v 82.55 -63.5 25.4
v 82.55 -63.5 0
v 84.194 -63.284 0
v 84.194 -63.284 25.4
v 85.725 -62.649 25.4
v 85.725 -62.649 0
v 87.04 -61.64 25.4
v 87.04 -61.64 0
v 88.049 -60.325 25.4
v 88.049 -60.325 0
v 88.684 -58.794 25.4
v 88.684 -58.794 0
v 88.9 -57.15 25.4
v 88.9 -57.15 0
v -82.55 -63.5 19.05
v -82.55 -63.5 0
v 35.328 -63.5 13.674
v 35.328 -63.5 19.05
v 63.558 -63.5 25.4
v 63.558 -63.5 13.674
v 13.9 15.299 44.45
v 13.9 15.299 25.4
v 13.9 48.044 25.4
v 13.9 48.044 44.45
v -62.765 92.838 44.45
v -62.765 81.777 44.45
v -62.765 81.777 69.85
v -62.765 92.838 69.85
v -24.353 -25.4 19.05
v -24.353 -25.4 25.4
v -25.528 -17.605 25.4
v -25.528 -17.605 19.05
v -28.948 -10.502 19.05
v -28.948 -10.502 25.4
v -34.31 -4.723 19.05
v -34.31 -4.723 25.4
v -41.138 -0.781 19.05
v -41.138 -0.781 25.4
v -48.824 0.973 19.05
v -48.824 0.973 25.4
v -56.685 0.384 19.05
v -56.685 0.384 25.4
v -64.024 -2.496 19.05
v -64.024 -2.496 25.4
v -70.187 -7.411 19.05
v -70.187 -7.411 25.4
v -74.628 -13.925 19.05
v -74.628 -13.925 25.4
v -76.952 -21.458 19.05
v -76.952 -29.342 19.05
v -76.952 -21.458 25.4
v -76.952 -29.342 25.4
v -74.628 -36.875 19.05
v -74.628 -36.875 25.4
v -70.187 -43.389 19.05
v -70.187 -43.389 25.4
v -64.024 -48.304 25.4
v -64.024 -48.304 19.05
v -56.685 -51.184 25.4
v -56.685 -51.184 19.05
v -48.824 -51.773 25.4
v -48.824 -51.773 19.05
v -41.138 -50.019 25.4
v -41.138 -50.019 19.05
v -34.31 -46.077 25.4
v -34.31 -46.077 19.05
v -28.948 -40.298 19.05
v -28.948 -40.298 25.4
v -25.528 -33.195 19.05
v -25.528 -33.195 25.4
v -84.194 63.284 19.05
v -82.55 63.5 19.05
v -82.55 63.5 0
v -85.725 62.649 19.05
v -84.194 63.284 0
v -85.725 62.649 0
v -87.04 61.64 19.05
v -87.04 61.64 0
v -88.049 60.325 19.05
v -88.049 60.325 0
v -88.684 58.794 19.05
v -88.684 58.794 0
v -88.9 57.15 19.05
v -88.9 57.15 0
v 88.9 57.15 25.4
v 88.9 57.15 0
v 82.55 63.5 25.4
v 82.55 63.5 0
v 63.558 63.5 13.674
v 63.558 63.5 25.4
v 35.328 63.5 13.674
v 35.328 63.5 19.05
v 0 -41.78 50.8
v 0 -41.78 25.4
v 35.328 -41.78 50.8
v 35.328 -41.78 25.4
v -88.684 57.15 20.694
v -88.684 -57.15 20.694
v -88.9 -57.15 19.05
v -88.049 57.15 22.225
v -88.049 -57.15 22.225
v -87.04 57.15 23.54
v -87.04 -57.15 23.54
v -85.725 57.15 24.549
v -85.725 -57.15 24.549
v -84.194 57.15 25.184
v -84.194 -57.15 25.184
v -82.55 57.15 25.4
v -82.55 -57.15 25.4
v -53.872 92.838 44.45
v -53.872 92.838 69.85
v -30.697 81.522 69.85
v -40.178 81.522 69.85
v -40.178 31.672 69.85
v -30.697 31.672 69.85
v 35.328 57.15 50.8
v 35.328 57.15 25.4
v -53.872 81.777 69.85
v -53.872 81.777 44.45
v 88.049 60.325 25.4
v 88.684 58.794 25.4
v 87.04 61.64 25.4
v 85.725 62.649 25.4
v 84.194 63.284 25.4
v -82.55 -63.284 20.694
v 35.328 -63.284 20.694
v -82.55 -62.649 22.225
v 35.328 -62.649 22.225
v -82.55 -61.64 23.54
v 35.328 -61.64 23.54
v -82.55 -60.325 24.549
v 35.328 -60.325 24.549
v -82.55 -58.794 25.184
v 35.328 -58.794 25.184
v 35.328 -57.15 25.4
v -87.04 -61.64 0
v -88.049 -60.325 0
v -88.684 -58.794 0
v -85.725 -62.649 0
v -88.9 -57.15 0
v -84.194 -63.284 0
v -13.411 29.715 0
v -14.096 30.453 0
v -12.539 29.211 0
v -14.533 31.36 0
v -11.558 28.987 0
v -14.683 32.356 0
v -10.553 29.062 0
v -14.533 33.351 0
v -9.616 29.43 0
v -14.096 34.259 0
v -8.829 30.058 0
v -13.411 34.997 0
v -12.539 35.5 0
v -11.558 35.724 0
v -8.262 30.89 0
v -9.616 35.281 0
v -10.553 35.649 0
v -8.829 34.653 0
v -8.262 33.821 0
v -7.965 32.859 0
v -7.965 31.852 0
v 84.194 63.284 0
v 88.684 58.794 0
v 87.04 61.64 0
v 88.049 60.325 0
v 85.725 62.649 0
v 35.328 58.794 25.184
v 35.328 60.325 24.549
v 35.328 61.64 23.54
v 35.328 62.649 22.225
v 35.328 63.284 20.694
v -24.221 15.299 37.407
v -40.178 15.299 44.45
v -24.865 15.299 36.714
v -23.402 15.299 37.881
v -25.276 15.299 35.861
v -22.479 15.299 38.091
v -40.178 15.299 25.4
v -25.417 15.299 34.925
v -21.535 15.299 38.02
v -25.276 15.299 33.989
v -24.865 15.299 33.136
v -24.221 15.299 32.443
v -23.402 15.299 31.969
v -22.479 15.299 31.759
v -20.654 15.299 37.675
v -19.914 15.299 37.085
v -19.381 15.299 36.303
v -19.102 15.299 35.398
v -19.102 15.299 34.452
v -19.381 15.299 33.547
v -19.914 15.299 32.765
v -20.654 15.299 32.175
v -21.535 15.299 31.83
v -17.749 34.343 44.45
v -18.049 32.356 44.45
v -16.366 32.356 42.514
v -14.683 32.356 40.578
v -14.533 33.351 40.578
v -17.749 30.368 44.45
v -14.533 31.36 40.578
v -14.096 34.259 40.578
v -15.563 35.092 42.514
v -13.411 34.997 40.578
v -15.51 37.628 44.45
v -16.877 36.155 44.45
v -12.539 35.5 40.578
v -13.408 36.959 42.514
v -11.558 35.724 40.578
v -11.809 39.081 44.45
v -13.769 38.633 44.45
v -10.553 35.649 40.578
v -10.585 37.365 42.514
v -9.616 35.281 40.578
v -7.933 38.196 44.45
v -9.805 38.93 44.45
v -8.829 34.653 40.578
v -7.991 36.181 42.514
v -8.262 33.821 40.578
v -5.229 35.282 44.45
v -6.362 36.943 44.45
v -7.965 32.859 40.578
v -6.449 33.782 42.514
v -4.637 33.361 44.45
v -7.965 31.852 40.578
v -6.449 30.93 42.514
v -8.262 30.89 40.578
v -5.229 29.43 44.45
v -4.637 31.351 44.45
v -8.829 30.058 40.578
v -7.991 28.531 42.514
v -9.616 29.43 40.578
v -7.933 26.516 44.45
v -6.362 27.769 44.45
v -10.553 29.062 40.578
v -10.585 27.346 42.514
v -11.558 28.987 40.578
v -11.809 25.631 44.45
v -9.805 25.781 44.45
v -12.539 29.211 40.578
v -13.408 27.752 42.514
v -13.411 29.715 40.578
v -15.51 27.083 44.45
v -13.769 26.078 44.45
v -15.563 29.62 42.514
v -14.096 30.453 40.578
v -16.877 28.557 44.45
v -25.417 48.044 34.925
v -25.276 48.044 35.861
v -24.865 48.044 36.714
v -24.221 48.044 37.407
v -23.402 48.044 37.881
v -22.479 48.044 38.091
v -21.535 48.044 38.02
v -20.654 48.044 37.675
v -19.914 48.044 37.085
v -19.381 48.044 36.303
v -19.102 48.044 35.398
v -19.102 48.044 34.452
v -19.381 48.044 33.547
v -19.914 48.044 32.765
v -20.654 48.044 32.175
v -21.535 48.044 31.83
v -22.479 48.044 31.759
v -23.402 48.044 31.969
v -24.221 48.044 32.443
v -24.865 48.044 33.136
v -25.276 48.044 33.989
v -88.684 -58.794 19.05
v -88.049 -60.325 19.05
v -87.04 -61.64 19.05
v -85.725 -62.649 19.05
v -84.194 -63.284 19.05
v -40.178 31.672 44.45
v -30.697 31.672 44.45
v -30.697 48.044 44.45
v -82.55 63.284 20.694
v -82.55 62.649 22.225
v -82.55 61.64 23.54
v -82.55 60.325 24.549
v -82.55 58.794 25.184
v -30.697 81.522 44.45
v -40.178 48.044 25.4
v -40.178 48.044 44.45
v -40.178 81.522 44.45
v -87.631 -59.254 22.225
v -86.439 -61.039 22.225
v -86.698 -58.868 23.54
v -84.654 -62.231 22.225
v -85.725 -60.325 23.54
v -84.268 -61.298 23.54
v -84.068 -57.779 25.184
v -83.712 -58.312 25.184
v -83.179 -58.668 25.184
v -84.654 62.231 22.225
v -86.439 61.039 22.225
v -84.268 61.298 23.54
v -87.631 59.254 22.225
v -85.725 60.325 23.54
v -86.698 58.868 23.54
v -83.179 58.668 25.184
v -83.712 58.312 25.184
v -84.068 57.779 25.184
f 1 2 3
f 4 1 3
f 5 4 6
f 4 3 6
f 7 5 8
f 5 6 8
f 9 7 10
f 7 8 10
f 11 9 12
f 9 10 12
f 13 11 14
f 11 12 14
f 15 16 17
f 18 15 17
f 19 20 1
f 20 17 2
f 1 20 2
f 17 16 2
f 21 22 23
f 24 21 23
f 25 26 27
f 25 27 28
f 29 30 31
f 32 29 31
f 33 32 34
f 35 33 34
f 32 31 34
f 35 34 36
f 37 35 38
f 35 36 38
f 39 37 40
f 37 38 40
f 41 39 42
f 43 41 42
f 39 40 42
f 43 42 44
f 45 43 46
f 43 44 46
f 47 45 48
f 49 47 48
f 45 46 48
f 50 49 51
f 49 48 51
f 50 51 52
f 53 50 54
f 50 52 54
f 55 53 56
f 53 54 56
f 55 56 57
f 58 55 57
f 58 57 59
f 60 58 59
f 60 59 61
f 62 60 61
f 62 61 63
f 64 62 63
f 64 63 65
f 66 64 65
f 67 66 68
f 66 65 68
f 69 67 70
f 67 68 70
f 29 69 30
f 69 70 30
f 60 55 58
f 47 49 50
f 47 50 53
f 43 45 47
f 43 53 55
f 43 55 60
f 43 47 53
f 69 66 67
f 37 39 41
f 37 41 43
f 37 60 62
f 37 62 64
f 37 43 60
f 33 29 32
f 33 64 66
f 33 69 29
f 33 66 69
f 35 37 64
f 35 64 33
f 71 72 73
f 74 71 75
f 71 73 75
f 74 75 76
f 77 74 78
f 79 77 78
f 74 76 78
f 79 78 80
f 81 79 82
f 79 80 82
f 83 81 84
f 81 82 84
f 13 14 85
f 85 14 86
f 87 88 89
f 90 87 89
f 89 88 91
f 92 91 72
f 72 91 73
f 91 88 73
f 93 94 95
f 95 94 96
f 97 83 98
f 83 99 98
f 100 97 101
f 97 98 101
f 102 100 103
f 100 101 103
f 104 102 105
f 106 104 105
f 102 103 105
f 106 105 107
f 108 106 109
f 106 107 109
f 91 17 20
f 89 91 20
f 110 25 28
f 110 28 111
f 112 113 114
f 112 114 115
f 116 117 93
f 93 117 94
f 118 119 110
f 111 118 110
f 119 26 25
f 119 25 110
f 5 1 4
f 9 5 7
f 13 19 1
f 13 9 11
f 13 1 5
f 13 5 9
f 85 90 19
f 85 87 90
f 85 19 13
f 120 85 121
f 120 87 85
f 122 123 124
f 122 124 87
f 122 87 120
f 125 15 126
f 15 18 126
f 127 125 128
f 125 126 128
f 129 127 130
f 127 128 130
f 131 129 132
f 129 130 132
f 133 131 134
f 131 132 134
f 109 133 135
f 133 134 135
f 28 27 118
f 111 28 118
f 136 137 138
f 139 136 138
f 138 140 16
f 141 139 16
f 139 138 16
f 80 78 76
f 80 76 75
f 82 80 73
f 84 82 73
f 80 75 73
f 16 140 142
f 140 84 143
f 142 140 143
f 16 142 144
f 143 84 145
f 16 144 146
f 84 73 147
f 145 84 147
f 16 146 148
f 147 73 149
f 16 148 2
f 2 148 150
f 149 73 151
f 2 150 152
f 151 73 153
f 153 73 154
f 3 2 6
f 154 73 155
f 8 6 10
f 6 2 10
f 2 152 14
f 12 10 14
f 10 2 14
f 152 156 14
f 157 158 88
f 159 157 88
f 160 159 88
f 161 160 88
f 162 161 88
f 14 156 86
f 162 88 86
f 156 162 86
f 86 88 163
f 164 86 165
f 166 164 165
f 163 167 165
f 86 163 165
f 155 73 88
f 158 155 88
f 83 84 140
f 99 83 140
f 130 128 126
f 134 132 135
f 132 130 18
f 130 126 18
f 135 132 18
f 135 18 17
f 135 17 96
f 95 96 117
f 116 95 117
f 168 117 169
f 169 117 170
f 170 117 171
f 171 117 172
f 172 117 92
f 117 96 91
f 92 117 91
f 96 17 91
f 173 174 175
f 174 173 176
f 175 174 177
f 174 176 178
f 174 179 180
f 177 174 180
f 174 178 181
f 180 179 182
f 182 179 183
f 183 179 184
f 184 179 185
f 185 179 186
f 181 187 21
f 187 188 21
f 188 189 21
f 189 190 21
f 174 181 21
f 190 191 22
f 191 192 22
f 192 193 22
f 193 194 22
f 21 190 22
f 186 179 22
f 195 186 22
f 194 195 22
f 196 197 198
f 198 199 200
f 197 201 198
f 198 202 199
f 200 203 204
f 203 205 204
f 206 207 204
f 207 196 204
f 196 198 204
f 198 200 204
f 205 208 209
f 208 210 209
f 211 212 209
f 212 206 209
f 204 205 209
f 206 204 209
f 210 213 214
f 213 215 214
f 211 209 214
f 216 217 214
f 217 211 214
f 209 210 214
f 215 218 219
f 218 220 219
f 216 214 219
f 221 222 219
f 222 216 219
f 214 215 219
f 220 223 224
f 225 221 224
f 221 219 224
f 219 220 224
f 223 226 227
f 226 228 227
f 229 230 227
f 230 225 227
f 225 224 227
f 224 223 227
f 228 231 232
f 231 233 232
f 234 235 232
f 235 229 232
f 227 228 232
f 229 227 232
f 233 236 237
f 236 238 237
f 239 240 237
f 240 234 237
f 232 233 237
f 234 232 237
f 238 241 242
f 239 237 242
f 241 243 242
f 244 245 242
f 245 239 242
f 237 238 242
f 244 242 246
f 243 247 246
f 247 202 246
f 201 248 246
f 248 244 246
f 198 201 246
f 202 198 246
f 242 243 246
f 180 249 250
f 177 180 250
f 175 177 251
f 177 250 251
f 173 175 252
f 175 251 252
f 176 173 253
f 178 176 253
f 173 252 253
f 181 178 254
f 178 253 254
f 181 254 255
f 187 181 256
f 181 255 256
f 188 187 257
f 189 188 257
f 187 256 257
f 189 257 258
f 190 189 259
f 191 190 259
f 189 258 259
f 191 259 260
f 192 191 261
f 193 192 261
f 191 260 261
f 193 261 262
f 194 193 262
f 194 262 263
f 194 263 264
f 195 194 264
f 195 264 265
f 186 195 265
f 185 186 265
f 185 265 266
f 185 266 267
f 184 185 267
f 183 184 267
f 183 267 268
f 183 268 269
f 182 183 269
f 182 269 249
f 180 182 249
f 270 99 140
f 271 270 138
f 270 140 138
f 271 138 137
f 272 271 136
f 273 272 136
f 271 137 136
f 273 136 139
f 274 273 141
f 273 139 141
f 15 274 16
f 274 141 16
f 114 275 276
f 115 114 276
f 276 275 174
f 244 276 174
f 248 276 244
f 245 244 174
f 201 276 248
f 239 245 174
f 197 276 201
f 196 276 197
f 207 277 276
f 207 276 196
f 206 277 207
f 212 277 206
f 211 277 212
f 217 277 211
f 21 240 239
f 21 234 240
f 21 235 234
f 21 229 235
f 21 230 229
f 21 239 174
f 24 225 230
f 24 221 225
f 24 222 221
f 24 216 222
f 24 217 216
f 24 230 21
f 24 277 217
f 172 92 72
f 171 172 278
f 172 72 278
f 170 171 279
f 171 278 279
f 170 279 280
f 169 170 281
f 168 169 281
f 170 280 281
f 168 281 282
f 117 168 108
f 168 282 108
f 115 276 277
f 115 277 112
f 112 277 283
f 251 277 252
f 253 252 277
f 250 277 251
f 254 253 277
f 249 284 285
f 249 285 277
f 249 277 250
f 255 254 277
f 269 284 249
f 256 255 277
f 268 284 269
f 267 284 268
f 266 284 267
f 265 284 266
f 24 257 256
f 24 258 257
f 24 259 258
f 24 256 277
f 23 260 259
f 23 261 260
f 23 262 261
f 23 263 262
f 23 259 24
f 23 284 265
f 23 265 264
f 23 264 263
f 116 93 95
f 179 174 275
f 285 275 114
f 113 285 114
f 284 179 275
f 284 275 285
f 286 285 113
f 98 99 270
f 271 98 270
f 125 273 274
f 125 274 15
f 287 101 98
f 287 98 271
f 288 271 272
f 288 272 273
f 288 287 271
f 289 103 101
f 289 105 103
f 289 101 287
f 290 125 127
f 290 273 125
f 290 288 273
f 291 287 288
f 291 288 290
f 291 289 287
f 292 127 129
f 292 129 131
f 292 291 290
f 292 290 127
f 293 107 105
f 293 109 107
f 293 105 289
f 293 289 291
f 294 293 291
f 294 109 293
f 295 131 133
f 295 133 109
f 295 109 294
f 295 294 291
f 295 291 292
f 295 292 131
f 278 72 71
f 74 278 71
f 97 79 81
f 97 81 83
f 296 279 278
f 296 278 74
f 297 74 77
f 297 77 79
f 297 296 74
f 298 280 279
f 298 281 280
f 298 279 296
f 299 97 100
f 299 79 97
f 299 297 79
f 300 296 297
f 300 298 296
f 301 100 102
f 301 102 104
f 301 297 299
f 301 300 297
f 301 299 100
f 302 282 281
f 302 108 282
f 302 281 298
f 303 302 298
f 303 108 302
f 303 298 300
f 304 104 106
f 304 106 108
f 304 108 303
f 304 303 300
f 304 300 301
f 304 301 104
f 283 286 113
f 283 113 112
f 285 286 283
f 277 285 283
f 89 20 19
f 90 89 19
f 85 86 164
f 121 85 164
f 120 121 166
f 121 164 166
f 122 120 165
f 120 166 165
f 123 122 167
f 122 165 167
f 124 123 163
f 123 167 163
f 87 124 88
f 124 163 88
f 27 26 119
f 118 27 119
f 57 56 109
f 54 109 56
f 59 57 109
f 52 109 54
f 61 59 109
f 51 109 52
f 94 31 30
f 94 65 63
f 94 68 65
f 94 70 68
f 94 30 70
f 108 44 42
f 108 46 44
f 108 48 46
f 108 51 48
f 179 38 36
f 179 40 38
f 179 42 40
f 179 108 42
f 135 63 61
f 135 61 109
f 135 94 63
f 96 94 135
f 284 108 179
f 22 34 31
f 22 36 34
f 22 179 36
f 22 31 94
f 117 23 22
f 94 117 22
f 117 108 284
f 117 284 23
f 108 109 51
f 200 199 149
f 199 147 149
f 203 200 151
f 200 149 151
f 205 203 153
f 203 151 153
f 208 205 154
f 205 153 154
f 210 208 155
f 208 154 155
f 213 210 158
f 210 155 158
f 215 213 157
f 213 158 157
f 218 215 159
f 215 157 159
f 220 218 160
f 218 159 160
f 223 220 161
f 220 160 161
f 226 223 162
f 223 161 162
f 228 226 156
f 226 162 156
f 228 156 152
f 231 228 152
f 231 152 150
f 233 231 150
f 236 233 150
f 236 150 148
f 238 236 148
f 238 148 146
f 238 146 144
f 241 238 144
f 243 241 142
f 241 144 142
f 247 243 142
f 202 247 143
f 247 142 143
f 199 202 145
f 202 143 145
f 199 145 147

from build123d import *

# Parameters (mm, degrees)
F1_DEPTH        = 25.4
F2_R            = 26.447214
F3_DEPTH        = 6.35
F4_W            = 28.229706
F4_H            = 11.726034
F5_DEPTH        = 127
F6_W            = 54.077805
F6_H            = 32.745095
F7_DEPTH        = 19.05
F8_R            = 6.35
F10_D           = 6.7564
F10_CSINK_D     = 13.4874
F10_CSINK_ANGLE = 82
F12_D           = 6.35
F16_DEPTH       = 25.4
F14_W           = 8.893858
F14_H           = 11.061027
F14_W_2         = 9.481337
F14_H_2         = 49.850044
F15_DEPTH       = 25.4


with BuildPart() as f1:
    # F0 (on Top) → F1 (new body)
    with BuildSketch(Plane.XY):
        with BuildLine():
            Line((-82.55, -63.5), (82.55, -63.5))
            ThreePointArc((82.55, -63.5), (87.040128, -61.640128), (88.9, -57.15))
            Line((88.9, -57.15), (88.9, 57.15))
            ThreePointArc((88.9, 57.15), (87.040128, 61.640128), (82.55, 63.5))
            Line((82.55, 63.5), (-82.55, 63.5))
            ThreePointArc((-82.55, 63.5), (-87.040128, 61.640128), (-88.9, 57.15))
            Line((-88.9, 57.15), (-88.9, -57.15))
            ThreePointArc((-88.9, -57.15), (-87.040128, -61.640128), (-82.55, -63.5))
        make_face()
    extrude(amount=F1_DEPTH)

    # F2 (on face) → F3 (cut)
    with BuildSketch(Plane.XY.offset(25.4)):
        with Locations((-50.8, -25.4)):
            Circle(F2_R)
    extrude(amount=-F3_DEPTH, mode=Mode.SUBTRACT)

    # F4 (on face) → F5 (cut)
    with BuildSketch(Plane.XZ.offset(63.5)):
        with Locations((49.442876, 19.536983)):
            Rectangle(F4_W, F4_H)
    extrude(amount=-F5_DEPTH, mode=Mode.SUBTRACT)

    # F6 (on face) → F7 (join)
    with BuildSketch(Plane.XY.offset(25.4)):
        with Locations((-13.139165, 31.671505)):
            Rectangle(F6_W, F6_H)
    extrude(amount=F7_DEPTH)

    # F8
    f8_edges = [f1.edges().sort_by_distance(p)[0] for p in [
        (-23.610988, -63.5, 25.4),
    ]]
    fillet(f8_edges, radius=F8_R)

    # F10 (through all)
    with Locations(Plane.XY.offset(44.45)):
        with Locations((-11.305165, 32.355733)):
            CounterSinkHole(F10_D / 2, F10_CSINK_D / 2, counter_sink_angle=F10_CSINK_ANGLE)

    # F12 (through all)
    with Locations(Plane.XZ.offset(-15.298957)):
        with Locations((-22.241747, 34.925)):
            Hole(F12_D / 2)

    # F13 (on face) → F16 (join)
    with BuildSketch(Plane.XY.offset(25.4)):
        Polygon((35.328023, 57.15), (0, -41.779853), (35.328023, -41.779853), align=None)
    extrude(amount=F16_DEPTH)

    # F14 (on face) → F15 (join)
    with BuildSketch(Plane.XY.offset(44.45)):
        with Locations((-58.318535, 87.307937)):
            Rectangle(F14_W, F14_H)
        with Locations((-35.437399, 56.596526)):
            Rectangle(F14_W_2, F14_H_2)
    extrude(amount=F15_DEPTH)


solid = f1.part
